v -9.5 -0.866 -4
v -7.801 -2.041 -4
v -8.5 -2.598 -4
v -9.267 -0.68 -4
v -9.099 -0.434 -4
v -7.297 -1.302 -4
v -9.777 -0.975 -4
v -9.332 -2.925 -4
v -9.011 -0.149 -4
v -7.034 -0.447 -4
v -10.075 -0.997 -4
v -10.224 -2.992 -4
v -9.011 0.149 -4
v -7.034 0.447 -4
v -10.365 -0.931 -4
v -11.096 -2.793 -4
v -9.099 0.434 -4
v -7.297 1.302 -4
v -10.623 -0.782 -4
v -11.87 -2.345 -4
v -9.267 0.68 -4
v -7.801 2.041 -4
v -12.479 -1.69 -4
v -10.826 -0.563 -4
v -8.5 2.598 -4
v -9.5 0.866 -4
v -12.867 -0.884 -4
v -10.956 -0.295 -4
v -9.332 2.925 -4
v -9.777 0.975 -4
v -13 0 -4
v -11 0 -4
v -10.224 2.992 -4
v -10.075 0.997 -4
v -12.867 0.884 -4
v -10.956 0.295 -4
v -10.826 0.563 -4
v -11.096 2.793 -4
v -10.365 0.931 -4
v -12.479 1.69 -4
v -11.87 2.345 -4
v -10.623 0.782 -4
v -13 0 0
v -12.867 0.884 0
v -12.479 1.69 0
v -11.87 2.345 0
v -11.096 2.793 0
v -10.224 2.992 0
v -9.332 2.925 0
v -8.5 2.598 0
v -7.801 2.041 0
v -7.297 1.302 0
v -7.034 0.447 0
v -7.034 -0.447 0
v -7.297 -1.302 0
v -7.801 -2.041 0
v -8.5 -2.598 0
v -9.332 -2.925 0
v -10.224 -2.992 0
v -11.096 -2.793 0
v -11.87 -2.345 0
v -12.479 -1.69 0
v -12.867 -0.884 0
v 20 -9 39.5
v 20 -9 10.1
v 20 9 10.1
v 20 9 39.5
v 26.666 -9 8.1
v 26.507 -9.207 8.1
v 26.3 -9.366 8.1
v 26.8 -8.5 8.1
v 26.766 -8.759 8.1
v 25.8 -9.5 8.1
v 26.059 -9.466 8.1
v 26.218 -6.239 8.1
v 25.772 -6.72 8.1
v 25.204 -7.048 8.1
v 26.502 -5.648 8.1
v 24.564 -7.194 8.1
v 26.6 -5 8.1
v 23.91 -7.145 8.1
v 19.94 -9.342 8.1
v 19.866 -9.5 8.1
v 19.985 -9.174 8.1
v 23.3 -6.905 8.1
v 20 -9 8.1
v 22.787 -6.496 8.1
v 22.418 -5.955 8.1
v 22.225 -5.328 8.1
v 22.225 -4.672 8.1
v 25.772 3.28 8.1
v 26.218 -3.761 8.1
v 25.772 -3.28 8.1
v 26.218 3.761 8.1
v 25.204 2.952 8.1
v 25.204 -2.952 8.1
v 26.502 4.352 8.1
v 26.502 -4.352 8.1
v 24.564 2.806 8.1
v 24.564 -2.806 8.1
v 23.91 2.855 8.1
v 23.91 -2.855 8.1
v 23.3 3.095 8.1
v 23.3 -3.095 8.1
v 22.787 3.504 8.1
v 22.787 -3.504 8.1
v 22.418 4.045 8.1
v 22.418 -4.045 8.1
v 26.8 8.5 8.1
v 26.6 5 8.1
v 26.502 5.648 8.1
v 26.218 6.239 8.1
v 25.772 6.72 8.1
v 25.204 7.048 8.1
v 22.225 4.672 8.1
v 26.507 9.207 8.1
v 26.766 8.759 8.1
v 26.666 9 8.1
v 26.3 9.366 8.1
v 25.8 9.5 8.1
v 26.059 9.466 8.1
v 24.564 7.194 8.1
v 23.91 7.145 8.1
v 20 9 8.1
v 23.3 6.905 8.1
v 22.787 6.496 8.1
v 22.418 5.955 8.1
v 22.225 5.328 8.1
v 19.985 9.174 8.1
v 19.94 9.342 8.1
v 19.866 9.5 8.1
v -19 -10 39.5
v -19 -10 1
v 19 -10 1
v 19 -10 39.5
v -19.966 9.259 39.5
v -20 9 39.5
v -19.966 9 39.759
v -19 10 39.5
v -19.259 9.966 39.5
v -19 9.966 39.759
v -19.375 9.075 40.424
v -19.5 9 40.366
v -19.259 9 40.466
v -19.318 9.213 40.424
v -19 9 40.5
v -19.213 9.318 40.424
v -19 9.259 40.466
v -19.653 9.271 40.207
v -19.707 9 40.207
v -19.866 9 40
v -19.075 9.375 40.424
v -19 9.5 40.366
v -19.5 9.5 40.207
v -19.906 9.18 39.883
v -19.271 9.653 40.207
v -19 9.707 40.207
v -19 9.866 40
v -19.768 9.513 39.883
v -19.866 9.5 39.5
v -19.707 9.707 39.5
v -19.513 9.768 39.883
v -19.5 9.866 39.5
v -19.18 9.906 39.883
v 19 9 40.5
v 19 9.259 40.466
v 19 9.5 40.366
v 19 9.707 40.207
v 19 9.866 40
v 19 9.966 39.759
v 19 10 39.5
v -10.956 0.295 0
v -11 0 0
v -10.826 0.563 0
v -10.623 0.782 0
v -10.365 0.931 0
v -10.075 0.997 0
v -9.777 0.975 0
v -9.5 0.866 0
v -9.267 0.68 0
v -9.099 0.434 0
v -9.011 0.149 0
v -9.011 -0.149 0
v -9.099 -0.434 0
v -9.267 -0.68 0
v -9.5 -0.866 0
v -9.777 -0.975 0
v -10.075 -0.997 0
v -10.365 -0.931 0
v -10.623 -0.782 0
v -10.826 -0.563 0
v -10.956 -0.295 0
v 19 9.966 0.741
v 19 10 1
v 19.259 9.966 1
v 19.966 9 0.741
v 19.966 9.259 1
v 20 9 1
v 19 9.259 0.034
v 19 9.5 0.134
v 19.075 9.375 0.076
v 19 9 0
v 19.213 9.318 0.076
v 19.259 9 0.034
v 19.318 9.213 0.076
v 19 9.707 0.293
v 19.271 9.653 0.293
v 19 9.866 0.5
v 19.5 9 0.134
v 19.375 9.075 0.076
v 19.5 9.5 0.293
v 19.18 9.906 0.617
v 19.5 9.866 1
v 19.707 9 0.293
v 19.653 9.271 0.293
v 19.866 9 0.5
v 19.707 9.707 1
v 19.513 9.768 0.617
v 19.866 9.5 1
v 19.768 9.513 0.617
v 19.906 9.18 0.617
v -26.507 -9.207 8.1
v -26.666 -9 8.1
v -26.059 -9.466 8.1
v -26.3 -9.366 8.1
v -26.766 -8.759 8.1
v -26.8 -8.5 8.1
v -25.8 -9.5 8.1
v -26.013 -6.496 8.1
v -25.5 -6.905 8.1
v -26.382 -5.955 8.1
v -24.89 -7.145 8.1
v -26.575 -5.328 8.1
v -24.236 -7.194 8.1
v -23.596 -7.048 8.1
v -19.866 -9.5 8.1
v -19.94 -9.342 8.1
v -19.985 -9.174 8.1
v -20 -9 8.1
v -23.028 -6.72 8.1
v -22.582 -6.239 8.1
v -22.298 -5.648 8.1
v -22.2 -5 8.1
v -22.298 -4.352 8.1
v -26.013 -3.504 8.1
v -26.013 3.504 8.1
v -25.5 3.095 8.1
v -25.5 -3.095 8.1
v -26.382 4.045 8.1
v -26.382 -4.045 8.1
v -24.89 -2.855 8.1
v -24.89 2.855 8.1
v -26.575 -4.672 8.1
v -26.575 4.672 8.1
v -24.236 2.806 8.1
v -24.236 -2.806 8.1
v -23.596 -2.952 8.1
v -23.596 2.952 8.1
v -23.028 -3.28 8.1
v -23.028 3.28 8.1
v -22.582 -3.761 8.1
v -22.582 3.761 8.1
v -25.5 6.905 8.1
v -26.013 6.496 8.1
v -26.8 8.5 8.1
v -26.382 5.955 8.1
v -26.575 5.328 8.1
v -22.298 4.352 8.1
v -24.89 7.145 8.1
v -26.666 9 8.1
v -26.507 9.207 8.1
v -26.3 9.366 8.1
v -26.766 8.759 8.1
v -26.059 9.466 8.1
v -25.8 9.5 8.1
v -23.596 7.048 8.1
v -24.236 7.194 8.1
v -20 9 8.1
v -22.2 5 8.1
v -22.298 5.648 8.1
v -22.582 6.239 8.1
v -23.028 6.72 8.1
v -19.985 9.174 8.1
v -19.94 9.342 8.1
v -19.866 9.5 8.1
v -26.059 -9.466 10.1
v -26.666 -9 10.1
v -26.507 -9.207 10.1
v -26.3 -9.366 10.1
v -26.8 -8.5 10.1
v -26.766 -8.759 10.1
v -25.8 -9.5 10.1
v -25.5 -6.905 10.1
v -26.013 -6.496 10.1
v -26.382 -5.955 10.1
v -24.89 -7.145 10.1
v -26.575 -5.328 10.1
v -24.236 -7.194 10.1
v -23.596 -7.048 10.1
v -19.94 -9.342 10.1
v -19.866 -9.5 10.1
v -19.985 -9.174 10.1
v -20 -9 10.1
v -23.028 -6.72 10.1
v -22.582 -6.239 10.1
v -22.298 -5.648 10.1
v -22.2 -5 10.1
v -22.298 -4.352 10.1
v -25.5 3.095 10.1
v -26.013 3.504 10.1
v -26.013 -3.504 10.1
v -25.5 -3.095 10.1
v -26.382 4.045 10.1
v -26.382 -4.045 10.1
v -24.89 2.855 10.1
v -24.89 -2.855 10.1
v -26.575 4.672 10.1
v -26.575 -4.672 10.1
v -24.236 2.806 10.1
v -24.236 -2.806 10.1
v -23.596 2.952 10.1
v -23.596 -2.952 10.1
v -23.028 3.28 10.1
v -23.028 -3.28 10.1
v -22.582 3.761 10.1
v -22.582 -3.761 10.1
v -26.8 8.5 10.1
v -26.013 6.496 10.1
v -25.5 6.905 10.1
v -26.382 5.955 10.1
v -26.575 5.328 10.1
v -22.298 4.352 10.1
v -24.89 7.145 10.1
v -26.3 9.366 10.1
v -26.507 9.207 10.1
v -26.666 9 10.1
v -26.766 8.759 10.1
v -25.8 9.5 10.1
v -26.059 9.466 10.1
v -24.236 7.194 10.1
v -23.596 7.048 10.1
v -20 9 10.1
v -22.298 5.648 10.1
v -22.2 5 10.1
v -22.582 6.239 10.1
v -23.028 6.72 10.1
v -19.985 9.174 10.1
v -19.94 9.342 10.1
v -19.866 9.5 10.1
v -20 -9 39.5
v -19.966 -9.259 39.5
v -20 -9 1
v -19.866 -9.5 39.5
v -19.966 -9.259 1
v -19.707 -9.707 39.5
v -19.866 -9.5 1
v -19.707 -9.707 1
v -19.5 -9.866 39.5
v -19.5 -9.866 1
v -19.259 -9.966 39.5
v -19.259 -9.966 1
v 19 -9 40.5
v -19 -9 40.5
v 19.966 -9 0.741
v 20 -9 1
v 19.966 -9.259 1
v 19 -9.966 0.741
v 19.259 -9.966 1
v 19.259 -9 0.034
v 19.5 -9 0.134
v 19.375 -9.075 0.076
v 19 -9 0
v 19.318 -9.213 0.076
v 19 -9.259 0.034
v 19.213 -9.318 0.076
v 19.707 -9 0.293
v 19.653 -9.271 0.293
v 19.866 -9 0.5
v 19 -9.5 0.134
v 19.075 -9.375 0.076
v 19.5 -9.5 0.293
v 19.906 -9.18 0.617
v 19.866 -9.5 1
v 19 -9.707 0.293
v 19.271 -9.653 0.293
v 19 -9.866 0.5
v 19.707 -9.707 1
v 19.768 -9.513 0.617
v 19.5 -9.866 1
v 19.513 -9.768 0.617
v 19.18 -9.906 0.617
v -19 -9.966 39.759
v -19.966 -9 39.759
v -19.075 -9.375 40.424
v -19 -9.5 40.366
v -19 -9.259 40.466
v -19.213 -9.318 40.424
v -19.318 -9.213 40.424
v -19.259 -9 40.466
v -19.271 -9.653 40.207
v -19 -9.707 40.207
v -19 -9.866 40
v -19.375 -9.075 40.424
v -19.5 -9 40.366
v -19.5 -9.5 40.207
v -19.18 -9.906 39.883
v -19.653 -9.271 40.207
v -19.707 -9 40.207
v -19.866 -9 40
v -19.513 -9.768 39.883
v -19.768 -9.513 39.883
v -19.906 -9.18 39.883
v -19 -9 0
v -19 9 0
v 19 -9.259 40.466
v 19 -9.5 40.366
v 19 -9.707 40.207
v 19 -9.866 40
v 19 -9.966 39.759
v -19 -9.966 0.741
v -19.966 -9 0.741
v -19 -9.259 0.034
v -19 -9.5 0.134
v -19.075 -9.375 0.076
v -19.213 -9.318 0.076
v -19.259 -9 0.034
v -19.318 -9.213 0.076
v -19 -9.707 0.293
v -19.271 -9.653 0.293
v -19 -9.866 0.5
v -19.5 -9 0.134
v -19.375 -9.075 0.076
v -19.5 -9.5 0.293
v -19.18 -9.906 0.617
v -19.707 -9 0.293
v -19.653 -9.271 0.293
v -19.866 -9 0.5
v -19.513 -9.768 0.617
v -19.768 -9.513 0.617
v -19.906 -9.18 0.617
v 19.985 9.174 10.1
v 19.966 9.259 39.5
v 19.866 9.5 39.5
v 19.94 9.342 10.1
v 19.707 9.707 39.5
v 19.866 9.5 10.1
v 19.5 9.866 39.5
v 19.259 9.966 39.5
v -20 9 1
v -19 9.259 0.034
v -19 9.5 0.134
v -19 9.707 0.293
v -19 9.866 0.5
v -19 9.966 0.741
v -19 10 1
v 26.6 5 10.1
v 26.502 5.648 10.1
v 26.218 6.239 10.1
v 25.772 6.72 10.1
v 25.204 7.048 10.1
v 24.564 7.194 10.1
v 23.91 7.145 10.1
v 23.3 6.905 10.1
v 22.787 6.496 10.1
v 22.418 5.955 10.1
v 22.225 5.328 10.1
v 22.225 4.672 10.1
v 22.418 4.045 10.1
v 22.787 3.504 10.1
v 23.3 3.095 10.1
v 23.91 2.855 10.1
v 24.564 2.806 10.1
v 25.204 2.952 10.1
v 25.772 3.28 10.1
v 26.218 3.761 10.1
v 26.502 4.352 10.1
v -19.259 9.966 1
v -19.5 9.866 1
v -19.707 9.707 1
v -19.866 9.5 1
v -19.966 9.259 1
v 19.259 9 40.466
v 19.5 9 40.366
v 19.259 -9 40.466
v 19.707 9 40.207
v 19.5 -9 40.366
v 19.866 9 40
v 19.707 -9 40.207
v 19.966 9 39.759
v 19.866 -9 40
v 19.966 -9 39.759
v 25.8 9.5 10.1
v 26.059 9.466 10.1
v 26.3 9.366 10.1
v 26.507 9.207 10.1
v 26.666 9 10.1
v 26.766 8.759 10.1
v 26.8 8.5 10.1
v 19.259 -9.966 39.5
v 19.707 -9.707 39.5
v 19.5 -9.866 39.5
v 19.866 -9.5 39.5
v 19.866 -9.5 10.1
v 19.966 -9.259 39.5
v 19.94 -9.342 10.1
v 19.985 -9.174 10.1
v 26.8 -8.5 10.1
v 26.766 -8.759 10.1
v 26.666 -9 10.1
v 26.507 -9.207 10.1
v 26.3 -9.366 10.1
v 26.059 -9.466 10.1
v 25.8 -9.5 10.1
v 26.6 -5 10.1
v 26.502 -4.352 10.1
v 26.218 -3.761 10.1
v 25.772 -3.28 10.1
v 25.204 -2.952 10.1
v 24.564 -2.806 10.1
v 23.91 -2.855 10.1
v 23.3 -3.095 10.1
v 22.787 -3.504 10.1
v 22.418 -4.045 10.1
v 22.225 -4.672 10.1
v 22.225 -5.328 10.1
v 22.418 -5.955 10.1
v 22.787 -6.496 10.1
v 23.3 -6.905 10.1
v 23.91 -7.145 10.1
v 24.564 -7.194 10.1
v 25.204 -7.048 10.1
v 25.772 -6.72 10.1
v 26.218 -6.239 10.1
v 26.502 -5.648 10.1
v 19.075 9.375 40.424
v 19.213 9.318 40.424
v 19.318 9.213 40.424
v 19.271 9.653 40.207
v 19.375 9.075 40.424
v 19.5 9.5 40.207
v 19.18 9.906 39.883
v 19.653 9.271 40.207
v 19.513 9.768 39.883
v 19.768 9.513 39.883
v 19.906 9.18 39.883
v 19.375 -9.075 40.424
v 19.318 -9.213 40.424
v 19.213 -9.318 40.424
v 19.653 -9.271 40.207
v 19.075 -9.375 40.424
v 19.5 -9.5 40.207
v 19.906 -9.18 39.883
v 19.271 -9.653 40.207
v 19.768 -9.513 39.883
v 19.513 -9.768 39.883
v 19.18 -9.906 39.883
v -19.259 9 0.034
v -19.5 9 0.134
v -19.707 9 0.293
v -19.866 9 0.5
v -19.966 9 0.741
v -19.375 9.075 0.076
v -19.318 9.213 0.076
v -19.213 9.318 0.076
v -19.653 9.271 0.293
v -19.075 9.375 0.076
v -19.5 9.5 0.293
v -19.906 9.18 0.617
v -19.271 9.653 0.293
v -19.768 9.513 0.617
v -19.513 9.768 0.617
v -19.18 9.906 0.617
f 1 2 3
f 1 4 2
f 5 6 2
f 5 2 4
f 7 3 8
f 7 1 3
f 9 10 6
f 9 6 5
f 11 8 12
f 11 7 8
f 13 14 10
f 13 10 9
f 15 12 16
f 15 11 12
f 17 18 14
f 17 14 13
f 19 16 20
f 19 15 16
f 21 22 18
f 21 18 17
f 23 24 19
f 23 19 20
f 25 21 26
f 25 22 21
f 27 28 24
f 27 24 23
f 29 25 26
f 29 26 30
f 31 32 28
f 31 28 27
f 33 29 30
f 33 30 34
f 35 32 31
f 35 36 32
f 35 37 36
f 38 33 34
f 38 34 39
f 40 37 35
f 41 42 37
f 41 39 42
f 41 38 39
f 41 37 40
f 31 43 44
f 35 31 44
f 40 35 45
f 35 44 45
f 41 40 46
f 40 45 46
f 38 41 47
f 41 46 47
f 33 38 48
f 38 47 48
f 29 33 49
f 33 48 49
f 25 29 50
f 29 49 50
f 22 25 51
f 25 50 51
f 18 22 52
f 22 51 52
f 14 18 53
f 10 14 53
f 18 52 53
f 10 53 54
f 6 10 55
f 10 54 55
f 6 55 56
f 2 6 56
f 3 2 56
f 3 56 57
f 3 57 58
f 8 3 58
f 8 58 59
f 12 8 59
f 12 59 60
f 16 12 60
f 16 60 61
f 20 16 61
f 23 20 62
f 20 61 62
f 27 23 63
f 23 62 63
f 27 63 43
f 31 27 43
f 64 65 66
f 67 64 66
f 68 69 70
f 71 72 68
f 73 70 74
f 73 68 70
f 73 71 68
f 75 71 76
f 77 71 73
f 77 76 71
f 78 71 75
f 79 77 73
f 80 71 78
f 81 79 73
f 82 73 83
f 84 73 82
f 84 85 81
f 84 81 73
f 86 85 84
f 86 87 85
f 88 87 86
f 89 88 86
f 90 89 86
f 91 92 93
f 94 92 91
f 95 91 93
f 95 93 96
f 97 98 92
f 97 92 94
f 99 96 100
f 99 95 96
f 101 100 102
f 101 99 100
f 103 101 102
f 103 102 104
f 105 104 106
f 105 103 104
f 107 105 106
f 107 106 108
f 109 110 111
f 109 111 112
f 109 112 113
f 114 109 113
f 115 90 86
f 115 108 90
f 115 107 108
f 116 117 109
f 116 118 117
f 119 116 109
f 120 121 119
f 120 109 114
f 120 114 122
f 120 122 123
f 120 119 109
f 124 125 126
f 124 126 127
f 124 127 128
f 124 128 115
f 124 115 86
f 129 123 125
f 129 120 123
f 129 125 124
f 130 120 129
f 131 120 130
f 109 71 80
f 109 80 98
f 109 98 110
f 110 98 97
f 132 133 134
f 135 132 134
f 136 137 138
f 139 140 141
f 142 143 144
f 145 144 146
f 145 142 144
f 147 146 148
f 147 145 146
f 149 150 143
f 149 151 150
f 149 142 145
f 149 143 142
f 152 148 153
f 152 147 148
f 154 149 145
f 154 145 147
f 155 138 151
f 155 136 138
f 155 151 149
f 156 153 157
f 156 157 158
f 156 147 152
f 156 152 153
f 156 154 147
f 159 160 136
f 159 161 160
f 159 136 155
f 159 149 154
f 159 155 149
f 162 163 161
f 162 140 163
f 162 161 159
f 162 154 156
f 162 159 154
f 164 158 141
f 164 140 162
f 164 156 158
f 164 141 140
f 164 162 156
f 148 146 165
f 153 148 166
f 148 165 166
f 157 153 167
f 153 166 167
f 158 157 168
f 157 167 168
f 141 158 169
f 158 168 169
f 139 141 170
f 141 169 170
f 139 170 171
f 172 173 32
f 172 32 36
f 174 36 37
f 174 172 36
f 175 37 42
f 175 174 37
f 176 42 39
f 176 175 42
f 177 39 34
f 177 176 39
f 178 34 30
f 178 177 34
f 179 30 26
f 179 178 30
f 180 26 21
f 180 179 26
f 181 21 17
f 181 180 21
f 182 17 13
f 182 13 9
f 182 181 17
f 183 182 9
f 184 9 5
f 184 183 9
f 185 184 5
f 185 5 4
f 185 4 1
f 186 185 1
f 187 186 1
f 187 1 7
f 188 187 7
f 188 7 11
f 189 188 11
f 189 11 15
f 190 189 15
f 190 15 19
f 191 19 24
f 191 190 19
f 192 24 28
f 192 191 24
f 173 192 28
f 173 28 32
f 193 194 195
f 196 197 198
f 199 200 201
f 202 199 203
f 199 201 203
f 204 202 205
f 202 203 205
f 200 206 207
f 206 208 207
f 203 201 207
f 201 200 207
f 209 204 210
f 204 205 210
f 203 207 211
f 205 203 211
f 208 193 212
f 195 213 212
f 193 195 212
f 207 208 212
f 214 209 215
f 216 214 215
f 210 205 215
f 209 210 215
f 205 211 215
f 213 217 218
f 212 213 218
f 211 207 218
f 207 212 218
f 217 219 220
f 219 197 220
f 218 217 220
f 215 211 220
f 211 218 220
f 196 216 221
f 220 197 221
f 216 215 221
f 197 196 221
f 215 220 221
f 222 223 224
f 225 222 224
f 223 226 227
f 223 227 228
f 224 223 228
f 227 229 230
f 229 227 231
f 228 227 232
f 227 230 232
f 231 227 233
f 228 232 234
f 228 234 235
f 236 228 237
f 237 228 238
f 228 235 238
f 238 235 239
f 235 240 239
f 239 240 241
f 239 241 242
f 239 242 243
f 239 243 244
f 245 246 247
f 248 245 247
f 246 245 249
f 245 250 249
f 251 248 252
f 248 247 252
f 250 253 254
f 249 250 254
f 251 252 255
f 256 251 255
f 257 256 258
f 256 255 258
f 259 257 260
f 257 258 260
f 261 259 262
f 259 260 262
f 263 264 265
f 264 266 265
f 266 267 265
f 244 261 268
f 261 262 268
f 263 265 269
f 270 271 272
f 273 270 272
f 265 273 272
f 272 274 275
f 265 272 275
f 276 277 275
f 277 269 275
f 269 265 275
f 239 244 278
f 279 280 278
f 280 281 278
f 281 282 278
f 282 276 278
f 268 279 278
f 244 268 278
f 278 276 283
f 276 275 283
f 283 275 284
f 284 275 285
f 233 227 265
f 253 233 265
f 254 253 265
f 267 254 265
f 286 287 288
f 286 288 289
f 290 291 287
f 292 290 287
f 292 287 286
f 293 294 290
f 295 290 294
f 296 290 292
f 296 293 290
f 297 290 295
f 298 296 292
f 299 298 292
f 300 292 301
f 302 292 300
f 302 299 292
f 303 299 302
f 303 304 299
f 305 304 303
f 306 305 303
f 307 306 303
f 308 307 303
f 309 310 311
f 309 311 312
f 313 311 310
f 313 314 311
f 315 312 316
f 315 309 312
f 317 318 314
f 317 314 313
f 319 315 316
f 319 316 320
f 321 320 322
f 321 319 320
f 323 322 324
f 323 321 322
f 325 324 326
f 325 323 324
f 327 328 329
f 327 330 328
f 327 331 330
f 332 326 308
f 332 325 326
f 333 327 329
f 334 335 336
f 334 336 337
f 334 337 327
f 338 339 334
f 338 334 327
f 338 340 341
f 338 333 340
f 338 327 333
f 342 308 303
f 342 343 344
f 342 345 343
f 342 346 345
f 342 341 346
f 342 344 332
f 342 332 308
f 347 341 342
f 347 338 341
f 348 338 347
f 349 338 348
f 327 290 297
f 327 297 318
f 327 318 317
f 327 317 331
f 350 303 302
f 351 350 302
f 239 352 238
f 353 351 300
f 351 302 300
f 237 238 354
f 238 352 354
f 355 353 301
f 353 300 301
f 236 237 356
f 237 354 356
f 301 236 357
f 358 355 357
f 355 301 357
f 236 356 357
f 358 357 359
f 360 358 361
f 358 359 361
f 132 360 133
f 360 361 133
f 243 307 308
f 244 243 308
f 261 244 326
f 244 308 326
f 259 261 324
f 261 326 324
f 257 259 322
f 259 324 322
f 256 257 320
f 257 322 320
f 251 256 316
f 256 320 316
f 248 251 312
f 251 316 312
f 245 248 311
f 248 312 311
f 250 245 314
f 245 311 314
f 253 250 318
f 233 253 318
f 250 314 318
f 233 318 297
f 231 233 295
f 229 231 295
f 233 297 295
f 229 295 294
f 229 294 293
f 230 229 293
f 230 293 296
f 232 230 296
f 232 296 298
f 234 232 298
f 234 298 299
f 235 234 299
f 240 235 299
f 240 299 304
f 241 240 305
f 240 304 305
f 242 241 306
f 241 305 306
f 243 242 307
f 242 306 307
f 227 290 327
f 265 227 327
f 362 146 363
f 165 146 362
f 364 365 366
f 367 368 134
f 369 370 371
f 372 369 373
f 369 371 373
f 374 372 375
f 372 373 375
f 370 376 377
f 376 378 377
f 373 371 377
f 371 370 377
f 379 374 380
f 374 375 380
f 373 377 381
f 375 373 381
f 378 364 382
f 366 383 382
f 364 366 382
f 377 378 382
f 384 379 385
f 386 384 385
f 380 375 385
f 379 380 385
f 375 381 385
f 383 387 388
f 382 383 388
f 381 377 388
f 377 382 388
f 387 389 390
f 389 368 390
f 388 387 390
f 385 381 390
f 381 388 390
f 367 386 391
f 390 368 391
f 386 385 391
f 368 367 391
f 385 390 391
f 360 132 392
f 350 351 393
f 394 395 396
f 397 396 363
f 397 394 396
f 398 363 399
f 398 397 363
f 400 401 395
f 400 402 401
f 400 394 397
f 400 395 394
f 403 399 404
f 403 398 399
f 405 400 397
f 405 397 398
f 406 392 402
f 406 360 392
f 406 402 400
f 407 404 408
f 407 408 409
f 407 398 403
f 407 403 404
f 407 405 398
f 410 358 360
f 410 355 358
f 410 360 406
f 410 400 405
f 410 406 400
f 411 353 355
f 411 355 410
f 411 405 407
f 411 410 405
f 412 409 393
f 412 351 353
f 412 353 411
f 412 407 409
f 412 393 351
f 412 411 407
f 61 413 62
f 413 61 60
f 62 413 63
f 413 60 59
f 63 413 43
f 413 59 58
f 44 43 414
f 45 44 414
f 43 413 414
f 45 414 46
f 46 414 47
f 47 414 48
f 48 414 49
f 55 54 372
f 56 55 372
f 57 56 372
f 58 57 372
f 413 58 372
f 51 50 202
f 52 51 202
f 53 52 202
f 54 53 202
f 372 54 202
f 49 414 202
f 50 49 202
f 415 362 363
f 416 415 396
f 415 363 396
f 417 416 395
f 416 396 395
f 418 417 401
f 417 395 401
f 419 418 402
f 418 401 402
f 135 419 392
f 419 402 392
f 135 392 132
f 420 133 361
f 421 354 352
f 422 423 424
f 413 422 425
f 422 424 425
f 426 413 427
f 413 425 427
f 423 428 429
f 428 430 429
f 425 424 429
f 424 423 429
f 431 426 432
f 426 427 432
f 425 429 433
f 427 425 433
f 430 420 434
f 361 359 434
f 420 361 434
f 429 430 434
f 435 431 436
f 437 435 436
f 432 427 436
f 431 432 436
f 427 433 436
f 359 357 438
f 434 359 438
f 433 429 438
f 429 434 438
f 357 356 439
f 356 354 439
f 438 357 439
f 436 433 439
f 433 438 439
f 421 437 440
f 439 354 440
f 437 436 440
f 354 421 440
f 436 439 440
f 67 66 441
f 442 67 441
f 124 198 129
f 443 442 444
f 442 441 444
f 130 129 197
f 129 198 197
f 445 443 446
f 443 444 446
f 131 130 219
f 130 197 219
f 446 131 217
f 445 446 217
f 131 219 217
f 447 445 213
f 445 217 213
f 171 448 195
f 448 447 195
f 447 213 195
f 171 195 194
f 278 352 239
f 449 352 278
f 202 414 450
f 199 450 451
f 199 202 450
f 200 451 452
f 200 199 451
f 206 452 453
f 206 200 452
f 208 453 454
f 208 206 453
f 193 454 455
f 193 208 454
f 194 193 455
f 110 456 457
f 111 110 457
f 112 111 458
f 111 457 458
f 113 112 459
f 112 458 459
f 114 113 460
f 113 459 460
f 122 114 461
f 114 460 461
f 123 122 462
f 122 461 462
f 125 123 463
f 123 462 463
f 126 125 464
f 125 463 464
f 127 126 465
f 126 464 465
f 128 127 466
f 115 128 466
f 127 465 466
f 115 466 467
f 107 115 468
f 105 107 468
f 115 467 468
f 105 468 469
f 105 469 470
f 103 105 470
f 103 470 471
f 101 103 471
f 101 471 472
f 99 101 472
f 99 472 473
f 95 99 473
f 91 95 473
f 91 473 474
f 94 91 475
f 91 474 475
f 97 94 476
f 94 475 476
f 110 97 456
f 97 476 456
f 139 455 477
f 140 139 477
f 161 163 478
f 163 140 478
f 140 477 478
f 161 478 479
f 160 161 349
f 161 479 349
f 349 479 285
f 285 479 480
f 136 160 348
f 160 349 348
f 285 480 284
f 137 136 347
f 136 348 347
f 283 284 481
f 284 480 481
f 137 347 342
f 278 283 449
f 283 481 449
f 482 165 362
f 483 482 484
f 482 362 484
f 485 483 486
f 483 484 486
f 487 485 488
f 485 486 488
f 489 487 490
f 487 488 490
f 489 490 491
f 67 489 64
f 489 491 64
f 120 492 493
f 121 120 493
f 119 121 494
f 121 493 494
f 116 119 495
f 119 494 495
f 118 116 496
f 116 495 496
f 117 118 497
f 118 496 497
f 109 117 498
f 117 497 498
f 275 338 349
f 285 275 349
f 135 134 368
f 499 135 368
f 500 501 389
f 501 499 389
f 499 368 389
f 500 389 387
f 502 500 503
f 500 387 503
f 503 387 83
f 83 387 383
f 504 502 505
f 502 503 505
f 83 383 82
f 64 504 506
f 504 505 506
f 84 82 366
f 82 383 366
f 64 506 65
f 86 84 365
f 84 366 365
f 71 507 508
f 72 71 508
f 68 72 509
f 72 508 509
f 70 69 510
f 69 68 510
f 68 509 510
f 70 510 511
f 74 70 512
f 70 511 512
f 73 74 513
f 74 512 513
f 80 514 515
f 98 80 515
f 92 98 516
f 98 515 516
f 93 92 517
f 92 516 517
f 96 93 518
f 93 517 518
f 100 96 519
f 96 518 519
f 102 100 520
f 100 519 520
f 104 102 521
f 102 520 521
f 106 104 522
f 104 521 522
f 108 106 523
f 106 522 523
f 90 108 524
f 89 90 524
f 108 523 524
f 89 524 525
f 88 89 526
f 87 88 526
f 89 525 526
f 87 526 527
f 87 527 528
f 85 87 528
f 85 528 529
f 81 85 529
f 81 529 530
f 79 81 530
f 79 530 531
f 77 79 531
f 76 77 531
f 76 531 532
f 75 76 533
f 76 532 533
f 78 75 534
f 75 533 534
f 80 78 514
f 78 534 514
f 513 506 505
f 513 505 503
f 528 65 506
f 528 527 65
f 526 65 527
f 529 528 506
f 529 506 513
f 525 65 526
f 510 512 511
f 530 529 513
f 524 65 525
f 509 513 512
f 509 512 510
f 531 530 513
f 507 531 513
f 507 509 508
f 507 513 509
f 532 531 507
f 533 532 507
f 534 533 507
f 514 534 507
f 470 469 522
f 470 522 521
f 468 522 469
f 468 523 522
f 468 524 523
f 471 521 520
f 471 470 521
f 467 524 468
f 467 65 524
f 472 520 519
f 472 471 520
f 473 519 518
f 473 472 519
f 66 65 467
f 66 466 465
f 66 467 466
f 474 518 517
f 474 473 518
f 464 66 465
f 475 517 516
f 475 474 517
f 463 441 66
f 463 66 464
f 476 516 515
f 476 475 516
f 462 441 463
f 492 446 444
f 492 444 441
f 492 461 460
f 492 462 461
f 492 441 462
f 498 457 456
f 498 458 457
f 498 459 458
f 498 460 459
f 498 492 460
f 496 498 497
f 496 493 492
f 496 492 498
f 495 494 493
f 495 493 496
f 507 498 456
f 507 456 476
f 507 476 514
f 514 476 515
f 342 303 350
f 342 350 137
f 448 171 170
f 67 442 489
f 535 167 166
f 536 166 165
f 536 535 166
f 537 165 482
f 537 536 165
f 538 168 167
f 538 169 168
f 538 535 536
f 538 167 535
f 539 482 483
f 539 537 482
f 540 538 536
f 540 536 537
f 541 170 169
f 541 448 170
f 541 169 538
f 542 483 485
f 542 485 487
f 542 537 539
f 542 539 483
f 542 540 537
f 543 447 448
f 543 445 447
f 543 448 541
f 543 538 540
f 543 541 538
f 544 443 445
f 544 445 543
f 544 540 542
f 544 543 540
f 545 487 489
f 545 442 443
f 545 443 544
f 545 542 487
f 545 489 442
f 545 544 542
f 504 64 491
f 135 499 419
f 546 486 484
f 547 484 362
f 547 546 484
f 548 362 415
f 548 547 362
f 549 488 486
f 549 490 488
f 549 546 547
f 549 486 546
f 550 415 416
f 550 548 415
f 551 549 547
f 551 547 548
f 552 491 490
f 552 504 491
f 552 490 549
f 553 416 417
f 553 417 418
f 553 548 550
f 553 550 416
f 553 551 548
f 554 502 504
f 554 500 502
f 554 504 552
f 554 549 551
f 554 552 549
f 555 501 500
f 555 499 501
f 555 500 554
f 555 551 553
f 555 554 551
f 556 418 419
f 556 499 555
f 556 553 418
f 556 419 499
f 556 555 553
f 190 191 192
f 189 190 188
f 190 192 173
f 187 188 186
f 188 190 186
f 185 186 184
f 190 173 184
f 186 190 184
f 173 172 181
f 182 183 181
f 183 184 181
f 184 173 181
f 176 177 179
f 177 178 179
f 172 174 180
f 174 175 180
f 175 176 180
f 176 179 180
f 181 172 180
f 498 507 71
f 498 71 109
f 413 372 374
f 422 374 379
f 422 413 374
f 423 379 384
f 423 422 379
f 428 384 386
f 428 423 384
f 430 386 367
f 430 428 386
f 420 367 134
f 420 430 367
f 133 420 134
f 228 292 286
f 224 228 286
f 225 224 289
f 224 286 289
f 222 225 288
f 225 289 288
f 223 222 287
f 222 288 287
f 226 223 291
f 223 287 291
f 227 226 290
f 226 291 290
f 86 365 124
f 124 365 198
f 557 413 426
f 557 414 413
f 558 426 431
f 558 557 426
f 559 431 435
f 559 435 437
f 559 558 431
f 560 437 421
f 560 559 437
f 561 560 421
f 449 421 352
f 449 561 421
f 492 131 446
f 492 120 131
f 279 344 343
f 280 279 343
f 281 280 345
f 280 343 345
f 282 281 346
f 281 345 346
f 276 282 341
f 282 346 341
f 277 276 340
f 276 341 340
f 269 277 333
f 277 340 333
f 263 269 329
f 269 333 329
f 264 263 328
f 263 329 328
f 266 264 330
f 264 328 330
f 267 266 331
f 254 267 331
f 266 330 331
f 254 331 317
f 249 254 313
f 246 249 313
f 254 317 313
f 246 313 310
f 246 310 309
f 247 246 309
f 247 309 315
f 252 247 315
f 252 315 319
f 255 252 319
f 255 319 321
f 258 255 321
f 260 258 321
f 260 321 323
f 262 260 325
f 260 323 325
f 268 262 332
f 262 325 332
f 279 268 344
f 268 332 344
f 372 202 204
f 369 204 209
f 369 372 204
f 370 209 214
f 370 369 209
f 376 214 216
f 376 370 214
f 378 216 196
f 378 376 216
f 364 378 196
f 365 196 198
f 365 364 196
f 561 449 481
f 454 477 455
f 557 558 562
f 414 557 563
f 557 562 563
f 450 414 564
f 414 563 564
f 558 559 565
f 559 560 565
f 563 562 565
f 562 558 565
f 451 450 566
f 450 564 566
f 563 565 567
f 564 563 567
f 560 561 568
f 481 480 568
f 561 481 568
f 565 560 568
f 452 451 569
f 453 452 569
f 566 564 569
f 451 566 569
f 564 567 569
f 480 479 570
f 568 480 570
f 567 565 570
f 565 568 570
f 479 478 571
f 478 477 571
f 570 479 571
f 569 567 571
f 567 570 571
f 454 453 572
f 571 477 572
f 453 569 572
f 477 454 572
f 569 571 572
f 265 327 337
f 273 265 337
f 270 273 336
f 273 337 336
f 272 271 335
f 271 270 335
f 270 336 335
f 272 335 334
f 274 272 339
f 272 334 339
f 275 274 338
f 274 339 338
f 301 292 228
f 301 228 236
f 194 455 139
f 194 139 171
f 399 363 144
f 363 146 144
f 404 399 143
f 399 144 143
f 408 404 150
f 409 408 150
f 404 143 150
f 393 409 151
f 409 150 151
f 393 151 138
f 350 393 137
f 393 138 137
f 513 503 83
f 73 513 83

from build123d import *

# Parameters (mm, degrees)
SKETCH1_W           = 40
SKETCH1_H           = 20
BOSS_EXTRUDE1_DEPTH = 40.5
SKETCH2_W           = 53.6
SKETCH2_H           = 19
BOSS_EXTRUDE2_DEPTH = 2
SKETCH3_R           = 2.2
CUT_EXTRUDE1_DEPTH  = 2
SKETCH4_R           = 3
SKETCH4_R_2         = 1
BOSS_EXTRUDE3_DEPTH = 4
FILLET1_R           = 1
FILLET2_R           = 1


with BuildPart() as part:
    # Sketch1 → Boss-Extrude1 (new body)
    with BuildSketch(Plane.XY):
        Rectangle(SKETCH1_W, SKETCH1_H)
    extrude(amount=BOSS_EXTRUDE1_DEPTH)

    # Sketch2 → Boss-Extrude2 (add)
    with BuildSketch(Plane.XY.offset(10.1)):
        Rectangle(SKETCH2_W, SKETCH2_H)
    extrude(amount=-BOSS_EXTRUDE2_DEPTH)

    # Sketch3 → Cut-Extrude1 (cut)
    with BuildSketch(Plane.XY.offset(10.1)):
        with Locations((-24.4, 5)):
            Circle(SKETCH3_R)
        with Locations((-24.4, -5)):
            Circle(SKETCH3_R)
        with Locations((24.4, 5)):
            Circle(SKETCH3_R)
        with Locations((24.4, -5)):
            Circle(SKETCH3_R)
    extrude(amount=-CUT_EXTRUDE1_DEPTH, mode=Mode.SUBTRACT)

    # Sketch4 → Boss-Extrude3 (add)
    with BuildSketch(Plane(origin=(0, 0, 0), x_dir=(-1, 0, 0), z_dir=(0, 0, -1))):
        with Locations((10, 0)):
            Circle(SKETCH4_R)
        with Locations((10, 0)):
            Circle(SKETCH4_R_2, mode=Mode.SUBTRACT)
    extrude(amount=BOSS_EXTRUDE3_DEPTH)

    # Fillet1
    # the kernel refuses this fillet: 1 mm, written as the material it takes off along each edge
    with BuildSketch(Plane(origin=(-26.8, -9.5, 12.6), x_dir=(1, 0, 0), z_dir=(0, 0, -1)), Plane(origin=(26.8, 9.5, 12.6), x_dir=(-1, 0, 0), z_dir=(0, 0, -1))) as fillet1_piece_1:
        with BuildLine():
            CenterArc((FILLET1_R, -FILLET1_R), FILLET1_R, 90, 90)
            Line((0, -FILLET1_R), (0, 0))
            Line((0, 0), (FILLET1_R, 0))
        make_face()
    extrude(amount=7, mode=Mode.SUBTRACT)
    with BuildSketch(Plane(origin=(-26.8, 9.5, 12.6), x_dir=(1, 0, 0), z_dir=(0, 0, -1)), Plane(origin=(26.8, -9.5, 12.6), x_dir=(-1, 0, 0), z_dir=(0, 0, -1))) as fillet1_piece_2:
        with BuildLine():
            CenterArc((FILLET1_R, FILLET1_R), FILLET1_R, 180, 90)
            Line((0, FILLET1_R), (0, 0))
            Line((0, 0), (FILLET1_R, 0))
        make_face()
    extrude(amount=7, mode=Mode.SUBTRACT)
    with BuildSketch(Plane(origin=(-20, 10, -2.5), x_dir=(0, -1, 0), z_dir=(0, 0, 1))) as fillet1_piece_3_section:
        with BuildLine():
            CenterArc((FILLET1_R, FILLET1_R), FILLET1_R, 180, 90)
            Line((0, FILLET1_R), (0, 0))
            Line((0, 0), (FILLET1_R, 0))
        make_face()
    fillet1_piece_3 = extrude(amount=45.5, mode=Mode.PRIVATE)
    fillet1_piece_3 = split(fillet1_piece_3, bisect_by=Plane(origin=(-19.975991618, 9.336749215, 8.1), z_dir=(0, 0, -1)), keep=Keep.TOP, mode=Mode.PRIVATE)
    fillet1_piece_3 = split(fillet1_piece_3, bisect_by=Plane(origin=(-19.975991618, 9.5, 2.8), z_dir=(0, -1, 0)), keep=Keep.TOP, mode=Mode.PRIVATE)
    add(fillet1_piece_3, mode=Mode.SUBTRACT)
    with BuildSketch(Plane(origin=(-20, 10, -2.5), x_dir=(0, -1, 0), z_dir=(0, 0, 1))) as fillet1_piece_4_section:
        with BuildLine():
            CenterArc((FILLET1_R, FILLET1_R), FILLET1_R, 180, 90)
            Line((0, FILLET1_R), (0, 0))
            Line((0, 0), (FILLET1_R, 0))
        make_face()
    fillet1_piece_4 = extrude(amount=45.5, mode=Mode.PRIVATE)
    fillet1_piece_4 = split(fillet1_piece_4, bisect_by=Plane(origin=(-19.74487994, 9.835608236, 8.1), z_dir=(0, 0, -1)), keep=Keep.TOP, mode=Mode.PRIVATE)
    fillet1_piece_4 = split(fillet1_piece_4, bisect_by=Plane(origin=(-19.74487994, 9.5, 2.8), z_dir=(0, 1, 0)), keep=Keep.TOP, mode=Mode.PRIVATE)
    add(fillet1_piece_4, mode=Mode.SUBTRACT)
    with BuildSketch(Plane(origin=(-20, 10, -2.5), x_dir=(0, -1, 0), z_dir=(0, 0, 1))) as fillet1_piece_5_section:
        with BuildLine():
            CenterArc((FILLET1_R, FILLET1_R), FILLET1_R, 180, 90)
            Line((0, FILLET1_R), (0, 0))
            Line((0, 0), (FILLET1_R, 0))
        make_face()
    fillet1_piece_5 = extrude(amount=45.5, mode=Mode.PRIVATE)
    fillet1_piece_5 = split(fillet1_piece_5, bisect_by=Plane(origin=(-19.74487994, 9.835608236, 8.1), z_dir=(0, 0, 1)), keep=Keep.TOP, mode=Mode.PRIVATE)
    fillet1_piece_5 = split(fillet1_piece_5, bisect_by=Plane(origin=(-19.74487994, 9.5, 9.1), z_dir=(0, 1, 0)), keep=Keep.TOP, mode=Mode.PRIVATE)
    fillet1_piece_5 = split(fillet1_piece_5, bisect_by=Plane(origin=(-19.74487994, 9.835608236, 10.1), z_dir=(0, 0, -1)), keep=Keep.TOP, mode=Mode.PRIVATE)
    add(fillet1_piece_5, mode=Mode.SUBTRACT)
    with BuildSketch(Plane(origin=(-20, 10, -2.5), x_dir=(0, -1, 0), z_dir=(0, 0, 1))) as fillet1_piece_6_section:
        with BuildLine():
            CenterArc((FILLET1_R, FILLET1_R), FILLET1_R, 180, 90)
            Line((0, FILLET1_R), (0, 0))
            Line((0, 0), (FILLET1_R, 0))
        make_face()
    fillet1_piece_6 = extrude(amount=45.5, mode=Mode.PRIVATE)
    fillet1_piece_6 = split(fillet1_piece_6, bisect_by=Plane(origin=(-19.975991618, 9.5, 26.55), z_dir=(0, -1, 0)), keep=Keep.TOP, mode=Mode.PRIVATE)
    fillet1_piece_6 = split(fillet1_piece_6, bisect_by=Plane(origin=(-19.975991618, 9.336749215, 10.1), z_dir=(0, 0, 1)), keep=Keep.TOP, mode=Mode.PRIVATE)
    add(fillet1_piece_6, mode=Mode.SUBTRACT)
    with BuildSketch(Plane(origin=(-20, 10, -2.5), x_dir=(0, -1, 0), z_dir=(0, 0, 1))) as fillet1_piece_7_section:
        with BuildLine():
            CenterArc((FILLET1_R, FILLET1_R), FILLET1_R, 180, 90)
            Line((0, FILLET1_R), (0, 0))
            Line((0, 0), (FILLET1_R, 0))
        make_face()
    fillet1_piece_7 = extrude(amount=45.5, mode=Mode.PRIVATE)
    fillet1_piece_7 = split(fillet1_piece_7, bisect_by=Plane(origin=(-19.74487994, 9.5, 26.55), z_dir=(0, 1, 0)), keep=Keep.TOP, mode=Mode.PRIVATE)
    fillet1_piece_7 = split(fillet1_piece_7, bisect_by=Plane(origin=(-19.74487994, 9.835608236, 10.1), z_dir=(0, 0, 1)), keep=Keep.TOP, mode=Mode.PRIVATE)
    add(fillet1_piece_7, mode=Mode.SUBTRACT)
    with BuildSketch(Plane(origin=(20, 10, -2.5), x_dir=(0, -1, 0), z_dir=(0, 0, 1))) as fillet1_piece_8_section:
        with BuildLine():
            CenterArc((FILLET1_R, -FILLET1_R), FILLET1_R, 90, 90)
            Line((0, -FILLET1_R), (0, 0))
            Line((0, 0), (FILLET1_R, 0))
        make_face()
    fillet1_piece_8 = extrude(amount=45.5, mode=Mode.PRIVATE)
    fillet1_piece_8 = split(fillet1_piece_8, bisect_by=Plane(origin=(19.975991618, 9.5, 2.8), z_dir=(0, -1, 0)), keep=Keep.TOP, mode=Mode.PRIVATE)
    fillet1_piece_8 = split(fillet1_piece_8, bisect_by=Plane(origin=(19.975991618, 9.336749215, 8.1), z_dir=(0, 0, -1)), keep=Keep.TOP, mode=Mode.PRIVATE)
    add(fillet1_piece_8, mode=Mode.SUBTRACT)
    with BuildSketch(Plane(origin=(20, 10, -2.5), x_dir=(0, -1, 0), z_dir=(0, 0, 1))) as fillet1_piece_9_section:
        with BuildLine():
            CenterArc((FILLET1_R, -FILLET1_R), FILLET1_R, 90, 90)
            Line((0, -FILLET1_R), (0, 0))
            Line((0, 0), (FILLET1_R, 0))
        make_face()
    fillet1_piece_9 = extrude(amount=45.5, mode=Mode.PRIVATE)
    fillet1_piece_9 = split(fillet1_piece_9, bisect_by=Plane(origin=(19.74487994, 9.5, 2.8), z_dir=(0, 1, 0)), keep=Keep.TOP, mode=Mode.PRIVATE)
    fillet1_piece_9 = split(fillet1_piece_9, bisect_by=Plane(origin=(19.74487994, 9.835608236, 8.1), z_dir=(0, 0, -1)), keep=Keep.TOP, mode=Mode.PRIVATE)
    add(fillet1_piece_9, mode=Mode.SUBTRACT)
    with BuildSketch(Plane(origin=(20, 10, -2.5), x_dir=(0, -1, 0), z_dir=(0, 0, 1))) as fillet1_piece_10_section:
        with BuildLine():
            CenterArc((FILLET1_R, -FILLET1_R), FILLET1_R, 90, 90)
            Line((0, -FILLET1_R), (0, 0))
            Line((0, 0), (FILLET1_R, 0))
        make_face()
    fillet1_piece_10 = extrude(amount=45.5, mode=Mode.PRIVATE)
    fillet1_piece_10 = split(fillet1_piece_10, bisect_by=Plane(origin=(19.74487994, 9.835608236, 10.1), z_dir=(0, 0, -1)), keep=Keep.TOP, mode=Mode.PRIVATE)
    fillet1_piece_10 = split(fillet1_piece_10, bisect_by=Plane(origin=(19.74487994, 9.5, 9.1), z_dir=(0, 1, 0)), keep=Keep.TOP, mode=Mode.PRIVATE)
    fillet1_piece_10 = split(fillet1_piece_10, bisect_by=Plane(origin=(19.74487994, 9.835608236, 8.1), z_dir=(0, 0, 1)), keep=Keep.TOP, mode=Mode.PRIVATE)
    add(fillet1_piece_10, mode=Mode.SUBTRACT)
    with BuildSketch(Plane(origin=(20, 10, -2.5), x_dir=(0, -1, 0), z_dir=(0, 0, 1))) as fillet1_piece_11_section:
        with BuildLine():
            CenterArc((FILLET1_R, -FILLET1_R), FILLET1_R, 90, 90)
            Line((0, -FILLET1_R), (0, 0))
            Line((0, 0), (FILLET1_R, 0))
        make_face()
    fillet1_piece_11 = extrude(amount=45.5, mode=Mode.PRIVATE)
    fillet1_piece_11 = split(fillet1_piece_11, bisect_by=Plane(origin=(19.975991618, 9.336749215, 10.1), z_dir=(0, 0, 1)), keep=Keep.TOP, mode=Mode.PRIVATE)
    fillet1_piece_11 = split(fillet1_piece_11, bisect_by=Plane(origin=(19.975991618, 9.5, 26.55), z_dir=(0, -1, 0)), keep=Keep.TOP, mode=Mode.PRIVATE)
    add(fillet1_piece_11, mode=Mode.SUBTRACT)
    with BuildSketch(Plane(origin=(20, 10, -2.5), x_dir=(0, -1, 0), z_dir=(0, 0, 1))) as fillet1_piece_12_section:
        with BuildLine():
            CenterArc((FILLET1_R, -FILLET1_R), FILLET1_R, 90, 90)
            Line((0, -FILLET1_R), (0, 0))
            Line((0, 0), (FILLET1_R, 0))
        make_face()
    fillet1_piece_12 = extrude(amount=45.5, mode=Mode.PRIVATE)
    fillet1_piece_12 = split(fillet1_piece_12, bisect_by=Plane(origin=(19.74487994, 9.835608236, 10.1), z_dir=(0, 0, 1)), keep=Keep.TOP, mode=Mode.PRIVATE)
    fillet1_piece_12 = split(fillet1_piece_12, bisect_by=Plane(origin=(19.74487994, 9.5, 26.55), z_dir=(0, 1, 0)), keep=Keep.TOP, mode=Mode.PRIVATE)
    add(fillet1_piece_12, mode=Mode.SUBTRACT)
    with BuildSketch(Plane(origin=(-20, -10, -2.5), x_dir=(1, 0, 0), z_dir=(0, 0, 1))) as fillet1_piece_13_section:
        with BuildLine():
            CenterArc((FILLET1_R, FILLET1_R), FILLET1_R, 180, 90)
            Line((0, FILLET1_R), (0, 0))
            Line((0, 0), (FILLET1_R, 0))
        make_face()
    fillet1_piece_13 = extrude(amount=45.5, mode=Mode.PRIVATE)
    fillet1_piece_13 = split(fillet1_piece_13, bisect_by=Plane(origin=(-19.74487994, -9.835608236, 8.1), z_dir=(0, 0, -1)), keep=Keep.TOP, mode=Mode.PRIVATE)
    fillet1_piece_13 = split(fillet1_piece_13, bisect_by=Plane(origin=(-19.74487994, -9.5, 2.8), z_dir=(0, -1, 0)), keep=Keep.TOP, mode=Mode.PRIVATE)
    add(fillet1_piece_13, mode=Mode.SUBTRACT)
    with BuildSketch(Plane(origin=(-20, -10, -2.5), x_dir=(1, 0, 0), z_dir=(0, 0, 1))) as fillet1_piece_14_section:
        with BuildLine():
            CenterArc((FILLET1_R, FILLET1_R), FILLET1_R, 180, 90)
            Line((0, FILLET1_R), (0, 0))
            Line((0, 0), (FILLET1_R, 0))
        make_face()
    fillet1_piece_14 = extrude(amount=45.5, mode=Mode.PRIVATE)
    fillet1_piece_14 = split(fillet1_piece_14, bisect_by=Plane(origin=(-19.975991618, -9.336749215, 8.1), z_dir=(0, 0, -1)), keep=Keep.TOP, mode=Mode.PRIVATE)
    fillet1_piece_14 = split(fillet1_piece_14, bisect_by=Plane(origin=(-19.975991618, -9.5, 2.8), z_dir=(0, 1, 0)), keep=Keep.TOP, mode=Mode.PRIVATE)
    add(fillet1_piece_14, mode=Mode.SUBTRACT)
    with BuildSketch(Plane(origin=(-20, -10, -2.5), x_dir=(1, 0, 0), z_dir=(0, 0, 1))) as fillet1_piece_15_section:
        with BuildLine():
            CenterArc((FILLET1_R, FILLET1_R), FILLET1_R, 180, 90)
            Line((0, FILLET1_R), (0, 0))
            Line((0, 0), (FILLET1_R, 0))
        make_face()
    fillet1_piece_15 = extrude(amount=45.5, mode=Mode.PRIVATE)
    fillet1_piece_15 = split(fillet1_piece_15, bisect_by=Plane(origin=(-19.74487994, -9.835608236, 8.1), z_dir=(0, 0, 1)), keep=Keep.TOP, mode=Mode.PRIVATE)
    fillet1_piece_15 = split(fillet1_piece_15, bisect_by=Plane(origin=(-19.74487994, -9.835608236, 10.1), z_dir=(0, 0, -1)), keep=Keep.TOP, mode=Mode.PRIVATE)
    fillet1_piece_15 = split(fillet1_piece_15, bisect_by=Plane(origin=(-19.74487994, -9.5, 9.1), z_dir=(0, -1, 0)), keep=Keep.TOP, mode=Mode.PRIVATE)
    add(fillet1_piece_15, mode=Mode.SUBTRACT)
    with BuildSketch(Plane(origin=(-20, -10, -2.5), x_dir=(1, 0, 0), z_dir=(0, 0, 1))) as fillet1_piece_16_section:
        with BuildLine():
            CenterArc((FILLET1_R, FILLET1_R), FILLET1_R, 180, 90)
            Line((0, FILLET1_R), (0, 0))
            Line((0, 0), (FILLET1_R, 0))
        make_face()
    fillet1_piece_16 = extrude(amount=45.5, mode=Mode.PRIVATE)
    fillet1_piece_16 = split(fillet1_piece_16, bisect_by=Plane(origin=(-19.74487994, -9.835608236, 10.1), z_dir=(0, 0, 1)), keep=Keep.TOP, mode=Mode.PRIVATE)
    fillet1_piece_16 = split(fillet1_piece_16, bisect_by=Plane(origin=(-19.74487994, -9.5, 26.55), z_dir=(0, -1, 0)), keep=Keep.TOP, mode=Mode.PRIVATE)
    add(fillet1_piece_16, mode=Mode.SUBTRACT)
    with BuildSketch(Plane(origin=(-20, -10, -2.5), x_dir=(1, 0, 0), z_dir=(0, 0, 1))) as fillet1_piece_17_section:
        with BuildLine():
            CenterArc((FILLET1_R, FILLET1_R), FILLET1_R, 180, 90)
            Line((0, FILLET1_R), (0, 0))
            Line((0, 0), (FILLET1_R, 0))
        make_face()
    fillet1_piece_17 = extrude(amount=45.5, mode=Mode.PRIVATE)
    fillet1_piece_17 = split(fillet1_piece_17, bisect_by=Plane(origin=(-19.975991618, -9.336749215, 10.1), z_dir=(0, 0, 1)), keep=Keep.TOP, mode=Mode.PRIVATE)
    fillet1_piece_17 = split(fillet1_piece_17, bisect_by=Plane(origin=(-19.975991618, -9.5, 26.55), z_dir=(0, 1, 0)), keep=Keep.TOP, mode=Mode.PRIVATE)
    add(fillet1_piece_17, mode=Mode.SUBTRACT)
    with BuildSketch(Plane(origin=(20, -10, -2.5), x_dir=(-1, 0, 0), z_dir=(0, 0, 1))) as fillet1_piece_18_section:
        with BuildLine():
            CenterArc((FILLET1_R, -FILLET1_R), FILLET1_R, 90, 90)
            Line((0, -FILLET1_R), (0, 0))
            Line((0, 0), (FILLET1_R, 0))
        make_face()
    fillet1_piece_18 = extrude(amount=45.5, mode=Mode.PRIVATE)
    fillet1_piece_18 = split(fillet1_piece_18, bisect_by=Plane(origin=(19.74487994, -9.835608236, 8.1), z_dir=(0, 0, -1)), keep=Keep.TOP, mode=Mode.PRIVATE)
    fillet1_piece_18 = split(fillet1_piece_18, bisect_by=Plane(origin=(19.74487994, -9.5, 2.8), z_dir=(0, -1, 0)), keep=Keep.TOP, mode=Mode.PRIVATE)
    add(fillet1_piece_18, mode=Mode.SUBTRACT)
    with BuildSketch(Plane(origin=(20, -10, -2.5), x_dir=(-1, 0, 0), z_dir=(0, 0, 1))) as fillet1_piece_19_section:
        with BuildLine():
            CenterArc((FILLET1_R, -FILLET1_R), FILLET1_R, 90, 90)
            Line((0, -FILLET1_R), (0, 0))
            Line((0, 0), (FILLET1_R, 0))
        make_face()
    fillet1_piece_19 = extrude(amount=45.5, mode=Mode.PRIVATE)
    fillet1_piece_19 = split(fillet1_piece_19, bisect_by=Plane(origin=(19.975991618, -9.336749215, 8.1), z_dir=(0, 0, -1)), keep=Keep.TOP, mode=Mode.PRIVATE)
    fillet1_piece_19 = split(fillet1_piece_19, bisect_by=Plane(origin=(19.975991618, -9.5, 2.8), z_dir=(0, 1, 0)), keep=Keep.TOP, mode=Mode.PRIVATE)
    add(fillet1_piece_19, mode=Mode.SUBTRACT)
    with BuildSketch(Plane(origin=(20, -10, -2.5), x_dir=(-1, 0, 0), z_dir=(0, 0, 1))) as fillet1_piece_20_section:
        with BuildLine():
            CenterArc((FILLET1_R, -FILLET1_R), FILLET1_R, 90, 90)
            Line((0, -FILLET1_R), (0, 0))
            Line((0, 0), (FILLET1_R, 0))
        make_face()
    fillet1_piece_20 = extrude(amount=45.5, mode=Mode.PRIVATE)
    fillet1_piece_20 = split(fillet1_piece_20, bisect_by=Plane(origin=(19.74487994, -9.835608236, 10.1), z_dir=(0, 0, -1)), keep=Keep.TOP, mode=Mode.PRIVATE)
    fillet1_piece_20 = split(fillet1_piece_20, bisect_by=Plane(origin=(19.74487994, -9.835608236, 8.1), z_dir=(0, 0, 1)), keep=Keep.TOP, mode=Mode.PRIVATE)
    fillet1_piece_20 = split(fillet1_piece_20, bisect_by=Plane(origin=(19.74487994, -9.5, 9.1), z_dir=(0, -1, 0)), keep=Keep.TOP, mode=Mode.PRIVATE)
    add(fillet1_piece_20, mode=Mode.SUBTRACT)
    with BuildSketch(Plane(origin=(20, -10, -2.5), x_dir=(-1, 0, 0), z_dir=(0, 0, 1))) as fillet1_piece_21_section:
        with BuildLine():
            CenterArc((FILLET1_R, -FILLET1_R), FILLET1_R, 90, 90)
            Line((0, -FILLET1_R), (0, 0))
            Line((0, 0), (FILLET1_R, 0))
        make_face()
    fillet1_piece_21 = extrude(amount=45.5, mode=Mode.PRIVATE)
    fillet1_piece_21 = split(fillet1_piece_21, bisect_by=Plane(origin=(19.74487994, -9.835608236, 10.1), z_dir=(0, 0, 1)), keep=Keep.TOP, mode=Mode.PRIVATE)
    fillet1_piece_21 = split(fillet1_piece_21, bisect_by=Plane(origin=(19.74487994, -9.5, 26.55), z_dir=(0, -1, 0)), keep=Keep.TOP, mode=Mode.PRIVATE)
    add(fillet1_piece_21, mode=Mode.SUBTRACT)
    with BuildSketch(Plane(origin=(20, -10, -2.5), x_dir=(-1, 0, 0), z_dir=(0, 0, 1))) as fillet1_piece_22_section:
        with BuildLine():
            CenterArc((FILLET1_R, -FILLET1_R), FILLET1_R, 90, 90)
            Line((0, -FILLET1_R), (0, 0))
            Line((0, 0), (FILLET1_R, 0))
        make_face()
    fillet1_piece_22 = extrude(amount=45.5, mode=Mode.PRIVATE)
    fillet1_piece_22 = split(fillet1_piece_22, bisect_by=Plane(origin=(19.975991618, -9.336749215, 10.1), z_dir=(0, 0, 1)), keep=Keep.TOP, mode=Mode.PRIVATE)
    fillet1_piece_22 = split(fillet1_piece_22, bisect_by=Plane(origin=(19.975991618, -9.5, 26.55), z_dir=(0, 1, 0)), keep=Keep.TOP, mode=Mode.PRIVATE)
    add(fillet1_piece_22, mode=Mode.SUBTRACT)

    # Fillet2
    fillet2_edges = [part.edges().sort_by_distance(p)[0] for p in [
        (-20, 0, 0),
        (-20, 0, 40.5),
        (20, 0, 0),
        (0, -10, 0),
        (0, 10, 0),
        (19.707106781, -9.707106781, 0),
        (-19.707106781, -9.707106781, 0),
        (19.707106781, 9.707106781, 0),
        (-19.707106781, 9.707106781, 0),
        (0, 10, 40.5),
        (20, 0, 40.5),
        (0, -10, 40.5),
        (19.707106781, -9.707106781, 40.5),
        (-19.707106781, -9.707106781, 40.5),
        (19.707106781, 9.707106781, 40.5),
        (-19.707106781, 9.707106781, 40.5),
    ]]
    fillet(fillet2_edges, radius=FILLET2_R)


solid = part.part
